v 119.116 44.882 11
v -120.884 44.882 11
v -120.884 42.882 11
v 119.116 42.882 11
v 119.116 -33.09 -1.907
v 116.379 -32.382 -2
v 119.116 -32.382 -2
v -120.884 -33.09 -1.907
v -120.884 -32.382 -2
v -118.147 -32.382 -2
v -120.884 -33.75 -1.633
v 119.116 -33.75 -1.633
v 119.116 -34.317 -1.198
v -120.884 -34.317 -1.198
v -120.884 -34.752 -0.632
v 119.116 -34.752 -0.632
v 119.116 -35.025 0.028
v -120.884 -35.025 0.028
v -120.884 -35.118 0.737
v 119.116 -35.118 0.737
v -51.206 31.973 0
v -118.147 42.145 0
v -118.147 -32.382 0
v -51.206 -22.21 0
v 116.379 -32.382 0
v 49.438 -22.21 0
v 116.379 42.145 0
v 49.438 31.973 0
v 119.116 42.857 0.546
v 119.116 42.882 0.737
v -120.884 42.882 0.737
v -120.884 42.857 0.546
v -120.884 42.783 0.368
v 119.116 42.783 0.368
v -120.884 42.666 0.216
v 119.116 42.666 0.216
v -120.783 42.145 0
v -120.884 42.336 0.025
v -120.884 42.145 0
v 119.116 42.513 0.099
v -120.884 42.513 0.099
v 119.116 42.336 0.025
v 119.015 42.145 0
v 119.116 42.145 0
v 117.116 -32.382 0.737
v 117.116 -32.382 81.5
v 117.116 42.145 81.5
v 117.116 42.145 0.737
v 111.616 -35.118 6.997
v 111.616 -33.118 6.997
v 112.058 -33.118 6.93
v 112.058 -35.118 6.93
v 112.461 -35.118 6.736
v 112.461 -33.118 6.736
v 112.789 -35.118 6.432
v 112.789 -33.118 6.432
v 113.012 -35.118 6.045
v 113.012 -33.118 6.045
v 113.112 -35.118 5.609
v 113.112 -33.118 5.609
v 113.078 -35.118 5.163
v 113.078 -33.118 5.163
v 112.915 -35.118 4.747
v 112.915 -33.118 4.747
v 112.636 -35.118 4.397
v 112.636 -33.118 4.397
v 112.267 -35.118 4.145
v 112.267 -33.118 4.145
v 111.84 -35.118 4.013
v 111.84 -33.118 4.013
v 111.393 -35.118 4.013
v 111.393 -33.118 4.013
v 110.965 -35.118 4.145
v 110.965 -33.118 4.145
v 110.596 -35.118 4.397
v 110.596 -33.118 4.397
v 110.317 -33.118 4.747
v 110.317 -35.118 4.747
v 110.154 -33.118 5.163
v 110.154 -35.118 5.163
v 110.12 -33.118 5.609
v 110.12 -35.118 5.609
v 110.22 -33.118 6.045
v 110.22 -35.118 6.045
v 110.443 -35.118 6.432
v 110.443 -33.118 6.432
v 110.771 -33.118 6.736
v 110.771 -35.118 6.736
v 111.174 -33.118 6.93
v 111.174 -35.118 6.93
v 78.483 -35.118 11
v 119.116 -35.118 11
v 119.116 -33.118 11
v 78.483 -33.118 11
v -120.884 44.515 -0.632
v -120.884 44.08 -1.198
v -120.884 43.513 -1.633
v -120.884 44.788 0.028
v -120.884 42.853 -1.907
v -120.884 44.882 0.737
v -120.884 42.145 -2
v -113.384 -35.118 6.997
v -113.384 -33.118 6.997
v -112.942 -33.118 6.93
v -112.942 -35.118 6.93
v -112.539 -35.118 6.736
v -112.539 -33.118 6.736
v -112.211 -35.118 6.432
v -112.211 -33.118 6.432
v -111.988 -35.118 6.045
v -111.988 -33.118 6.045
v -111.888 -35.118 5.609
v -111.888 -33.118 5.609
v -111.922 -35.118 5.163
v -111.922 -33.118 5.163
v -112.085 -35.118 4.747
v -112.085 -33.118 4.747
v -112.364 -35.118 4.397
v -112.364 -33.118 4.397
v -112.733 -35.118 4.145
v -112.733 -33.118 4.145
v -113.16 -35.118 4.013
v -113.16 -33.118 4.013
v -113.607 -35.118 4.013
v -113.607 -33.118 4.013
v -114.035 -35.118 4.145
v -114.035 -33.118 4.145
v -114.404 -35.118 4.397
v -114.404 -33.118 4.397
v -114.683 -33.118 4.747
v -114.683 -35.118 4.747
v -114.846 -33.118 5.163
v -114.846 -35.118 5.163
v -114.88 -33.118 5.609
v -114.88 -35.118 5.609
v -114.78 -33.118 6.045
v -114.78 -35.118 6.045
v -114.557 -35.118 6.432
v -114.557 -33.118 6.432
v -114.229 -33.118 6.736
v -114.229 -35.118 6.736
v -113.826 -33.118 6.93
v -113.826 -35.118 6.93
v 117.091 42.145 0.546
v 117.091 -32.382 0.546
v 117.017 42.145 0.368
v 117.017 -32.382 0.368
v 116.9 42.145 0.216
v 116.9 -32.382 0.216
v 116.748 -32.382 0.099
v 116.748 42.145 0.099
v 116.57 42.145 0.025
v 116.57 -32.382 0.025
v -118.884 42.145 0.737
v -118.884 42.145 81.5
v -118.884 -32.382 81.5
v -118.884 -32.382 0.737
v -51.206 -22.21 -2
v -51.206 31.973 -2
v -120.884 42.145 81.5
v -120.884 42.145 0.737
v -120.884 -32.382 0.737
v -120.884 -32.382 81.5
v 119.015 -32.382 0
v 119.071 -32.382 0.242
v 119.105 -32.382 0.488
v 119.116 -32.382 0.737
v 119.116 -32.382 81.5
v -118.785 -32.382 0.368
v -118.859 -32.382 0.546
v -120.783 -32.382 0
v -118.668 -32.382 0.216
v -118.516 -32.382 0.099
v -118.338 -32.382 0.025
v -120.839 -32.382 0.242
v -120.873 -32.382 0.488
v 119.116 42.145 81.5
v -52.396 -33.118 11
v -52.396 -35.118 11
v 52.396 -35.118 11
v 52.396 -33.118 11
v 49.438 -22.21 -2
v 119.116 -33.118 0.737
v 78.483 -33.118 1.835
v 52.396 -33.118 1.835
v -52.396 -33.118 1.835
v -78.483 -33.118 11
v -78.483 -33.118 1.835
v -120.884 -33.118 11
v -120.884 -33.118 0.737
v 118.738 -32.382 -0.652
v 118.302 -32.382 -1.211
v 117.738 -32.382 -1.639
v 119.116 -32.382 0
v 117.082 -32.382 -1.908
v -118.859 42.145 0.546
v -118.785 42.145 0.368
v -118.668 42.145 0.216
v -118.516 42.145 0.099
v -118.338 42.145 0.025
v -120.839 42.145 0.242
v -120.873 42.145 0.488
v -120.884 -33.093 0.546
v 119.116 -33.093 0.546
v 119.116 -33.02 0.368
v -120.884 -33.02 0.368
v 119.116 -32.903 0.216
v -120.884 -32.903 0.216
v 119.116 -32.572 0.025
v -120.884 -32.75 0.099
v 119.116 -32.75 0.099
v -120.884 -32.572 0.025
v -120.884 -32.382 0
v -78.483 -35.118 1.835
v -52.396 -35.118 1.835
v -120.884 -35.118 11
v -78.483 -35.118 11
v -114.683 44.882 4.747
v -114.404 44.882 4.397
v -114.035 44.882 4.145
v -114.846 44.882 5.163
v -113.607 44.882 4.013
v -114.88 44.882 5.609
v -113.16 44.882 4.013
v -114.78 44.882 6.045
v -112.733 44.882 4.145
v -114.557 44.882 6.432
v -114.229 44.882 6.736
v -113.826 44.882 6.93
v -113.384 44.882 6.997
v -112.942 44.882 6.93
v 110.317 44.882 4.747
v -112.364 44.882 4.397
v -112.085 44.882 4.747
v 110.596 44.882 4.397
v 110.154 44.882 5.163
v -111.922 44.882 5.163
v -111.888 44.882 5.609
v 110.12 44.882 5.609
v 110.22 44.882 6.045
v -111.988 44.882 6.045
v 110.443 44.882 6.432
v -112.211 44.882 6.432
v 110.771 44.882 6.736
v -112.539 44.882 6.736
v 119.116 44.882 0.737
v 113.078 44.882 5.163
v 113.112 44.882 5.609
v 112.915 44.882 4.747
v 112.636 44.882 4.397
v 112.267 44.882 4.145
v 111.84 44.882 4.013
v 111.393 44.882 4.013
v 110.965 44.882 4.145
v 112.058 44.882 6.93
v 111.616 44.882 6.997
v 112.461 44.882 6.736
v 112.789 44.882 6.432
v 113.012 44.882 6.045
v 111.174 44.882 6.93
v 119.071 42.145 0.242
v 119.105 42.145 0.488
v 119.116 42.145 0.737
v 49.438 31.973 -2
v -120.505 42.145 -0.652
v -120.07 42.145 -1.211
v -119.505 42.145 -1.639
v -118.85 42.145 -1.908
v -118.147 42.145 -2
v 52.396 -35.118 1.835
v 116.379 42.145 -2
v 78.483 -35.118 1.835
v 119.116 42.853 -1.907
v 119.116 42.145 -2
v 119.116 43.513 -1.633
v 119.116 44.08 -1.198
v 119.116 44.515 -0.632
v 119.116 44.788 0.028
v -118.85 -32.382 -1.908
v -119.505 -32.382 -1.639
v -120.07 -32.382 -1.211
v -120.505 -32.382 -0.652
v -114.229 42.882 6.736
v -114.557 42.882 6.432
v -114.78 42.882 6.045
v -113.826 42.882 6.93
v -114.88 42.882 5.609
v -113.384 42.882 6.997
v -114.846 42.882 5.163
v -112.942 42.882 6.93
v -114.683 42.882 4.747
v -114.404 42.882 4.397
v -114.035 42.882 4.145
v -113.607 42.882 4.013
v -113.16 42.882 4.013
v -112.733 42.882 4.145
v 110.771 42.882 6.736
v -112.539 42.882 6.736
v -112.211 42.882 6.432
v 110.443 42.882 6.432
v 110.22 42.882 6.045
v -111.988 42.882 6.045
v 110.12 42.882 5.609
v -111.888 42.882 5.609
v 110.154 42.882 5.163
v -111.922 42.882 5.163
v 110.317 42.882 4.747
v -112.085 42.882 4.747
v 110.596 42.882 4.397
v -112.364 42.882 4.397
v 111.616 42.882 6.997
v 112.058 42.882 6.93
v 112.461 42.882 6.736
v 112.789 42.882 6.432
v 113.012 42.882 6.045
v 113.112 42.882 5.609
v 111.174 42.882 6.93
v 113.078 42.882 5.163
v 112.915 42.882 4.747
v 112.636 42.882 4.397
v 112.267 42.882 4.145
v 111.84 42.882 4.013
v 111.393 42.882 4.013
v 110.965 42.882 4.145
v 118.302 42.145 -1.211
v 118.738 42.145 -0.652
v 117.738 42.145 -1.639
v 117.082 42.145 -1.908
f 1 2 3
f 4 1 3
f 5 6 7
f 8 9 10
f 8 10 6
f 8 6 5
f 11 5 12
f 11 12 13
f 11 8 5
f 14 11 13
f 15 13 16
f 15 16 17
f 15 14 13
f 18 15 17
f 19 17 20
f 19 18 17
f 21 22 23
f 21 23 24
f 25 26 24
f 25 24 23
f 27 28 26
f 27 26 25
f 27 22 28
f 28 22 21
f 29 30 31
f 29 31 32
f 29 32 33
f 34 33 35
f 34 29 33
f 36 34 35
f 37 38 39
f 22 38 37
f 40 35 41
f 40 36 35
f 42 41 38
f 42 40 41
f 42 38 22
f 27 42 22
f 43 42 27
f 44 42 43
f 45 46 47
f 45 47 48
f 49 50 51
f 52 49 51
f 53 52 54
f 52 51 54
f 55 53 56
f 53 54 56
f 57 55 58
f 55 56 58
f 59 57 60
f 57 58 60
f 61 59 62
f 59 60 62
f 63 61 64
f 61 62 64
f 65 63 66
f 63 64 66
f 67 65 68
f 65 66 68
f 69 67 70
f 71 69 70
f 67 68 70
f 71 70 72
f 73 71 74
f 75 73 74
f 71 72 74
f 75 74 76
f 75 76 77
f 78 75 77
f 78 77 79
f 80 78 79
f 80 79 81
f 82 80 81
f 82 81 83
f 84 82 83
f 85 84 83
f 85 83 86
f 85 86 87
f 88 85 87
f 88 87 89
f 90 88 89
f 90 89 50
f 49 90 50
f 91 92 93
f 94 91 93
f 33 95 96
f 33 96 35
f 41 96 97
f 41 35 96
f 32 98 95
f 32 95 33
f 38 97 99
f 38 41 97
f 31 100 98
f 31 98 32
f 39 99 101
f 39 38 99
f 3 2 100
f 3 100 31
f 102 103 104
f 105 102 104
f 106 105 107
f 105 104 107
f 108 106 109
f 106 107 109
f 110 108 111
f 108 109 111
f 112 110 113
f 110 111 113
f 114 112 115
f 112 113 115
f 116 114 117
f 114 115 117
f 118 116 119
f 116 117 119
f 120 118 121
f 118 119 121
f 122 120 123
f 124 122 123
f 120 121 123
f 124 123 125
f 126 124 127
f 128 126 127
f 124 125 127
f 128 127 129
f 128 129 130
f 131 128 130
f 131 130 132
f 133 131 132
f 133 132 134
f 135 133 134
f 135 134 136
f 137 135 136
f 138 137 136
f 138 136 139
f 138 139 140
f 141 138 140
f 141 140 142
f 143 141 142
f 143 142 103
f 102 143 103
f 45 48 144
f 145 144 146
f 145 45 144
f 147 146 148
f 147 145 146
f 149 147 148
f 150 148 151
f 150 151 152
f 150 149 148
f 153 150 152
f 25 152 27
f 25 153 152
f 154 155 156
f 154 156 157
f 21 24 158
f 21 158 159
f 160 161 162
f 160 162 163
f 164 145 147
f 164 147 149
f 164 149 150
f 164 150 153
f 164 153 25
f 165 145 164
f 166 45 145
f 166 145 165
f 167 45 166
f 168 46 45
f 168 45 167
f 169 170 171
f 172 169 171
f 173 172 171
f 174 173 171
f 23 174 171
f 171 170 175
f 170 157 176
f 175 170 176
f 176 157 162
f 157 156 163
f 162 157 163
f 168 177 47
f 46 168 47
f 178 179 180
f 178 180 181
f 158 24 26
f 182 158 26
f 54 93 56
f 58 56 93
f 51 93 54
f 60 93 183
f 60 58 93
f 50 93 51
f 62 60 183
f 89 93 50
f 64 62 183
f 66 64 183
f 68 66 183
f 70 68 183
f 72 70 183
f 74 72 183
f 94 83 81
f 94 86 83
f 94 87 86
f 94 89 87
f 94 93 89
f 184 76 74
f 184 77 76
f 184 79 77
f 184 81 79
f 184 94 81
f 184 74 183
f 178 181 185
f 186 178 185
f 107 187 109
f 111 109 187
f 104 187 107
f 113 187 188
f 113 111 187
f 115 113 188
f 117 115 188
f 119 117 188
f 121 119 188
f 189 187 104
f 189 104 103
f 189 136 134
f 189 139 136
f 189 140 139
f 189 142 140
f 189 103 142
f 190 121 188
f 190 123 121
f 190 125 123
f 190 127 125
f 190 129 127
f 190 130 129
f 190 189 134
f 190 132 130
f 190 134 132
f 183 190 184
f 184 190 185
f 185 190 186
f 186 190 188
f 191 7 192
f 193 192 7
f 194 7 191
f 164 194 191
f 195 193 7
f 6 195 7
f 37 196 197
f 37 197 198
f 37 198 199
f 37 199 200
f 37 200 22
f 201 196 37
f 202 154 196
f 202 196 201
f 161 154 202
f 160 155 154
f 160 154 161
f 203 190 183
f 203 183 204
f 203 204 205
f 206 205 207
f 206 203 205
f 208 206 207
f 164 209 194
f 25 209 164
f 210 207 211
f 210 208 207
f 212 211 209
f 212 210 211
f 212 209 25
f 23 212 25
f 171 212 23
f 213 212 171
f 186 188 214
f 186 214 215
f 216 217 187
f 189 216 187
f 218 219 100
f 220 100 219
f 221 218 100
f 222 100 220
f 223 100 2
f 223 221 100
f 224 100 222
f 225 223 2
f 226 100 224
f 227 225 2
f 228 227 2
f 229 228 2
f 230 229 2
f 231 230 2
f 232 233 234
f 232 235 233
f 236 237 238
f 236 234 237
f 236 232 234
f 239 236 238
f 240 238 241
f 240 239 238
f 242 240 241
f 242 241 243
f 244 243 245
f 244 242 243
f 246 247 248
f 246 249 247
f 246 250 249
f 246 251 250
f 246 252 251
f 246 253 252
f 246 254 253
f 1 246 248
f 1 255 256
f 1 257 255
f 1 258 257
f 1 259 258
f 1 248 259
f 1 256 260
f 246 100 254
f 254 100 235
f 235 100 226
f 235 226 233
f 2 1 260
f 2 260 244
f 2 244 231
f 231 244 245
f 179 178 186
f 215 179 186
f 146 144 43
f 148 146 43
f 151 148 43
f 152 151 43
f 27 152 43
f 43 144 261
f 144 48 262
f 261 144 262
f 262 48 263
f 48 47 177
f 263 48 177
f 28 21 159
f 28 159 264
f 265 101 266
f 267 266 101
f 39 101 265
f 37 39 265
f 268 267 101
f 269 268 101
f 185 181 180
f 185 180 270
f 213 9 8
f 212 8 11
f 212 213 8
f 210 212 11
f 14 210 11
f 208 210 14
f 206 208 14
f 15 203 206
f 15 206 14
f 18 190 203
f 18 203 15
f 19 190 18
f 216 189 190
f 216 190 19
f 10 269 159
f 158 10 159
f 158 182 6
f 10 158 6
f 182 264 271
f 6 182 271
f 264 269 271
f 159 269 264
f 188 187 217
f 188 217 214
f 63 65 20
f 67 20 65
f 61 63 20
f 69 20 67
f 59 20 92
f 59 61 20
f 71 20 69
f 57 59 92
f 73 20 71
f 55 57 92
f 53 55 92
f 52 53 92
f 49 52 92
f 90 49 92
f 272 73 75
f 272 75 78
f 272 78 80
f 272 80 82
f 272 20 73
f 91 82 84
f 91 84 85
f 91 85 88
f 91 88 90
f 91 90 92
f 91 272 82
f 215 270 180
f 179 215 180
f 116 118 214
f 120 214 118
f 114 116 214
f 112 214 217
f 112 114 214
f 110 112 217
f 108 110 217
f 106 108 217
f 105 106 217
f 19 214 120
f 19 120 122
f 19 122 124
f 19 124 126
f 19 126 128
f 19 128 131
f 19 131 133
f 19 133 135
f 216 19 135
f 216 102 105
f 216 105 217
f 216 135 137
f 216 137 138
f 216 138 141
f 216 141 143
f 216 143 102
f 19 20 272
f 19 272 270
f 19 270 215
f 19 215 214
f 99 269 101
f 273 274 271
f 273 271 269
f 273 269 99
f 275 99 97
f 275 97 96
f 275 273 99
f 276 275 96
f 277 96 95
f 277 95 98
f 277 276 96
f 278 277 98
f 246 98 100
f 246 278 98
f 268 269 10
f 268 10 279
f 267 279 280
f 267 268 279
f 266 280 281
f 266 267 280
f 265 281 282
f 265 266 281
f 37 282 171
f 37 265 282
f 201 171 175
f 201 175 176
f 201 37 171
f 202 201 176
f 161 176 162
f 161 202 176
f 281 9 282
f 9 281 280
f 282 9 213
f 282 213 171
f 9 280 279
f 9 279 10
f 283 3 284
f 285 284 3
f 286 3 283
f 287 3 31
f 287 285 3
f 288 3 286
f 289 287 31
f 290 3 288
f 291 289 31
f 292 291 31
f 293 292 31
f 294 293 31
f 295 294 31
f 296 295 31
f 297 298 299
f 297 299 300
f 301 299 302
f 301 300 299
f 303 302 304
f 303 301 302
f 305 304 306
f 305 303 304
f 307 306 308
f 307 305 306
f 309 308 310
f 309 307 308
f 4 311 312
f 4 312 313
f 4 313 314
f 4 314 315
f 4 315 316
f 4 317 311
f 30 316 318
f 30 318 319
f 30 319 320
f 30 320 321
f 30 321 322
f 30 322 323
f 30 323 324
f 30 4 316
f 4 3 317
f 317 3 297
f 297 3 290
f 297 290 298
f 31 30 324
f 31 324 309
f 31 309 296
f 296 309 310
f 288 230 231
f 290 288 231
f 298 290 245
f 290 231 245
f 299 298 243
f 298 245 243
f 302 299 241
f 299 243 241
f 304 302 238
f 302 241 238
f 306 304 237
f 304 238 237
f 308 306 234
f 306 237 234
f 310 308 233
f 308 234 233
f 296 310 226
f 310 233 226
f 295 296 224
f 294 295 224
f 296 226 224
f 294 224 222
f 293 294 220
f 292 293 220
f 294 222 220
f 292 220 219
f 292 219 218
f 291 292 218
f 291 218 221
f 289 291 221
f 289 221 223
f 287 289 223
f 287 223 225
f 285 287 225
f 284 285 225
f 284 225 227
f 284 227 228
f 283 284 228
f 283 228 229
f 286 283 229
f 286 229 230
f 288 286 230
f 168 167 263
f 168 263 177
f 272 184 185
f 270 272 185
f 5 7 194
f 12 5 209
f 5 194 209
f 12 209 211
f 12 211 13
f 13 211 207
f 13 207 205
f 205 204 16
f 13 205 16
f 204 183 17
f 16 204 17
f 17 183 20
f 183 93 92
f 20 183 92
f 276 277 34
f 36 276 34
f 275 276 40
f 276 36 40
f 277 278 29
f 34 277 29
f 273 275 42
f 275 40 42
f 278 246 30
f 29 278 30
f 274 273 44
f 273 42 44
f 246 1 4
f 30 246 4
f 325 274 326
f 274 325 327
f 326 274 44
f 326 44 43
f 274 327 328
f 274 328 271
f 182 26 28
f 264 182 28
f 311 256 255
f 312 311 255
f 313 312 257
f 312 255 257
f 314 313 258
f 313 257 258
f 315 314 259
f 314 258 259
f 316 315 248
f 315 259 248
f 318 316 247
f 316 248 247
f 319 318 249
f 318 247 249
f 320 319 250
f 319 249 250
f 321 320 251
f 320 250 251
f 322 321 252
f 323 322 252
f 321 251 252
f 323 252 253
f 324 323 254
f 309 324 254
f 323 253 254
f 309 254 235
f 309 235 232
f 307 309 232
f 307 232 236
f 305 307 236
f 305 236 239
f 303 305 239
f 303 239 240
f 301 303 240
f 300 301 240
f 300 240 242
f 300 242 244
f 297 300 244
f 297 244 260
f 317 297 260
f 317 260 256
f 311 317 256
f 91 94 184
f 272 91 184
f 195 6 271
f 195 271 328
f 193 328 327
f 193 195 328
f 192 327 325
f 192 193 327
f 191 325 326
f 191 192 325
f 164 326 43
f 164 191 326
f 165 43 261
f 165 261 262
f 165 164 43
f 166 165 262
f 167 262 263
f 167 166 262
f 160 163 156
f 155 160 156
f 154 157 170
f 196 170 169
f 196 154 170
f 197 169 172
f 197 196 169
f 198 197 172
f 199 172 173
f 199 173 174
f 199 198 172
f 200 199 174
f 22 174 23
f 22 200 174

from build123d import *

# Parameters (mm, degrees)
SKETCH31_W                     = 240
SKETCH31_H                     = 80
BASE_FLANGE1_DEPTH             = 2
EDGE_FLANGE1_STRIP_W           = 9.4732
EDGE_FLANGE1_STRIP_H           = 2
EDGE_FLANGE1_STRIP_CUT_DEPTH   = 240
EDGE_FLANGE1_STRIP_2_W         = 9.4732
EDGE_FLANGE1_STRIP_2_H         = 2
EDGE_FLANGE1_STRIP_CUT_2_DEPTH = 240
EDGE_FLANGE1_DEPTH             = 240
EDGE_FLANGE1_BEND_DEPTH        = 240
EDGE_FLANGE2_STRIP_W           = 9.4732
EDGE_FLANGE2_STRIP_H           = 2
EDGE_FLANGE2_STRIP_CUT_DEPTH   = 74.5268
EDGE_FLANGE2_STRIP_2_W         = 9.4732
EDGE_FLANGE2_STRIP_2_H         = 2
EDGE_FLANGE2_STRIP_CUT_2_DEPTH = 74.5268
EDGE_FLANGE2_DEPTH             = 74.5268
EDGE_FLANGE2_BEND_DEPTH        = 74.5268
SKETCH52_W                     = 26.086706926
SKETCH52_H                     = 9.115658902
CUT_EXTRUDE2_DEPTH             = 10
SKETCH53_W                     = 26.086706926
SKETCH53_H                     = 0.049167759
CUT_EXTRUDE3_DEPTH             = 10
SKETCH61_R                     = 1.5
CUT_EXTRUDE8_DEPTH             = 167.29844137
SKETCH62_R                     = 1.5
CUT_EXTRUDE9_DEPTH             = 167.29844137
SKETCH65_W                     = 100.644593538
SKETCH65_H                     = 54.18299384
CUT_EXTRUDE11_DEPTH            = 153.543535722


# Sheet-metal steps are written as plain solids
with BuildPart() as part:
    # Base-Flange1: sheet metal written as solids
    # Sketch31 → Base-Flange1 (new body)
    with BuildSketch(Plane.XY):
        with Locations((-0.883917881, 4.881607463)):
            Rectangle(SKETCH31_W, SKETCH31_H)
    extrude(amount=-BASE_FLANGE1_DEPTH)

    # Edge-Flange1: sheet metal written as solids
    # Edge-Flange1 strip (on a plane across the edge) → Edge-Flange1 strip cut (cut)
    with BuildSketch(Plane(origin=(119.116082119, 44.881607463, 0), x_dir=(0, -1, 0), z_dir=(-1, 0, 0))):
        with Locations((-2, -1)):
            Rectangle(EDGE_FLANGE1_STRIP_W, EDGE_FLANGE1_STRIP_H)
    extrude(amount=EDGE_FLANGE1_STRIP_CUT_DEPTH, mode=Mode.SUBTRACT)

    # Edge-Flange1 strip 2 (on a plane across the edge) → Edge-Flange1 strip cut 2 (cut)
    with BuildSketch(Plane(origin=(-120.883917881, -35.118392537, 0), x_dir=(0, 1, 0), z_dir=(1, 0, 0))):
        with Locations((-2, -1)):
            Rectangle(EDGE_FLANGE1_STRIP_2_W, EDGE_FLANGE1_STRIP_2_H)
    extrude(amount=EDGE_FLANGE1_STRIP_CUT_2_DEPTH, mode=Mode.SUBTRACT)

    # Edge-Flange1 section (on a plane across the edge) → Edge-Flange1 (add)
    with BuildSketch(Plane(origin=(119.116082119, 44.881607463, 0), x_dir=(0, -1, 0), z_dir=(-1, 0, 0))):
        with BuildLine():
            Line((0, 0.7366), (0, 11))
            Line((0, 11), (2, 11))
            Line((2, 11), (2, 0.7366))
            ThreePointArc((2, 0.7366), (2.215745145, 0.215745145), (2.7366, 0))
            Line((2.7366, 0), (2.7366, -2))
            ThreePointArc((2.7366, -2), (0.801531583, -1.198468417), (0, 0.7366))
        make_face()
    extrude(amount=EDGE_FLANGE1_DEPTH)

    # Edge-Flange1 section 2 (on a plane across the edge) → Edge-Flange1 bend (add)
    with BuildSketch(Plane(origin=(-120.883917881, -35.118392537, 0), x_dir=(0, 1, 0), z_dir=(1, 0, 0))):
        with BuildLine():
            Line((0, 0.7366), (0, 11))
            Line((0, 11), (2, 11))
            Line((2, 11), (2, 0.7366))
            ThreePointArc((2, 0.7366), (2.215745145, 0.215745145), (2.7366, 0))
            Line((2.7366, 0), (2.7366, -2))
            ThreePointArc((2.7366, -2), (0.801531583, -1.198468417), (0, 0.7366))
        make_face()
    extrude(amount=EDGE_FLANGE1_BEND_DEPTH)

    # Edge-Flange2: sheet metal written as solids
    # Edge-Flange2 strip (on a plane across the edge) → Edge-Flange2 strip cut (cut)
    with BuildSketch(Plane(origin=(-120.883917881, 42.145007463, 0), x_dir=(1, 0, 0), z_dir=(0, -1, 0))):
        with Locations((-2, -1)):
            Rectangle(EDGE_FLANGE2_STRIP_W, EDGE_FLANGE2_STRIP_H)
    extrude(amount=EDGE_FLANGE2_STRIP_CUT_DEPTH, mode=Mode.SUBTRACT)

    # Edge-Flange2 strip 2 (on a plane across the edge) → Edge-Flange2 strip cut 2 (cut)
    with BuildSketch(Plane(origin=(119.116082119, -32.381792537, 0), x_dir=(-1, 0, 0), z_dir=(0, 1, 0))):
        with Locations((-2, -1)):
            Rectangle(EDGE_FLANGE2_STRIP_2_W, EDGE_FLANGE2_STRIP_2_H)
    extrude(amount=EDGE_FLANGE2_STRIP_CUT_2_DEPTH, mode=Mode.SUBTRACT)

    # Edge-Flange2 section (on a plane across the edge) → Edge-Flange2 (add)
    with BuildSketch(Plane(origin=(-120.883917881, 42.145007463, 0), x_dir=(1, 0, 0), z_dir=(0, -1, 0))):
        with BuildLine():
            Line((0, 0.7366), (0, 81.5))
            Line((0, 81.5), (2, 81.5))
            Line((2, 81.5), (2, 0.7366))
            ThreePointArc((2, 0.7366), (2.215745145, 0.215745145), (2.7366, 0))
            Line((2.7366, 0), (2.7366, -2))
            ThreePointArc((2.7366, -2), (0.801531583, -1.198468417), (0, 0.7366))
        make_face()
    extrude(amount=EDGE_FLANGE2_DEPTH)

    # Edge-Flange2 section 2 (on a plane across the edge) → Edge-Flange2 bend (add)
    with BuildSketch(Plane(origin=(119.116082119, -32.381792537, 0), x_dir=(-1, 0, 0), z_dir=(0, 1, 0))):
        with BuildLine():
            Line((0, 0.7366), (0, 81.5))
            Line((0, 81.5), (2, 81.5))
            Line((2, 81.5), (2, 0.7366))
            ThreePointArc((2, 0.7366), (2.215745145, 0.215745145), (2.7366, 0))
            Line((2.7366, 0), (2.7366, -2))
            ThreePointArc((2.7366, -2), (0.801531583, -1.198468417), (0, 0.7366))
        make_face()
    extrude(amount=EDGE_FLANGE2_BEND_DEPTH)

    # Sketch52 → Cut-Extrude2 (cut)
    with BuildSketch(Plane(origin=(0, -33.118392537, 0), x_dir=(1, 0, 0), z_dir=(0, 1, 0))):
        with Locations((-65.439575559, -6.39300279)):
            Rectangle(SKETCH52_W, SKETCH52_H)
    cut_extrude2 = extrude(amount=-CUT_EXTRUDE2_DEPTH, mode=Mode.SUBTRACT)

    # Sketch53 → Cut-Extrude3 (cut)
    with BuildSketch(Plane(origin=(0, -33.118392537, 0), x_dir=(1, 0, 0), z_dir=(0, 1, 0))):
        with Locations((-65.439575559, -10.975416121)):
            Rectangle(SKETCH53_W, SKETCH53_H)
    cut_extrude3 = extrude(amount=-CUT_EXTRUDE3_DEPTH, mode=Mode.SUBTRACT)

    # Mirror3: Cut-Extrude3 across plane
    add(cut_extrude3.mirror(Plane(origin=(0, 0, 0), x_dir=(0, 0, 1), z_dir=(1, 0, 0))), mode=Mode.SUBTRACT)

    # Mirror4: Cut-Extrude2, Cut-Extrude3 across plane
    add(cut_extrude2.mirror(Plane(origin=(0, 0, 0), x_dir=(0, 0, 1), z_dir=(1, 0, 0))), mode=Mode.SUBTRACT)
    add(cut_extrude3.mirror(Plane(origin=(0, 0, 0), x_dir=(0, 0, 1), z_dir=(1, 0, 0))), mode=Mode.SUBTRACT)

    # Sketch61 → Cut-Extrude8 (cut, through all)
    with BuildSketch(Plane(origin=(0, 44.881607463, 0), x_dir=(1, 0, 0), z_dir=(0, 1, 0))):
        with Locations(Location((111.616082119, -5.4966, 0), (0, 0, 270))):
            Circle(SKETCH61_R)
    extrude(amount=-CUT_EXTRUDE8_DEPTH, mode=Mode.SUBTRACT)

    # Sketch62 → Cut-Extrude9 (cut, through all)
    with BuildSketch(Plane(origin=(0, 44.881607463, 0), x_dir=(1, 0, 0), z_dir=(0, 1, 0))):
        with Locations(Location((-113.383917881, -5.4966, 0), (0, 0, 270))):
            Circle(SKETCH62_R)
    extrude(amount=-CUT_EXTRUDE9_DEPTH, mode=Mode.SUBTRACT)

    # Sketch65 → Cut-Extrude11 (cut, through all)
    with BuildSketch(Plane.XY):
        with Locations((-0.883917881, 4.881607463)):
            Rectangle(SKETCH65_W, SKETCH65_H)
    extrude(amount=-CUT_EXTRUDE11_DEPTH, mode=Mode.SUBTRACT)


solid = part.part
